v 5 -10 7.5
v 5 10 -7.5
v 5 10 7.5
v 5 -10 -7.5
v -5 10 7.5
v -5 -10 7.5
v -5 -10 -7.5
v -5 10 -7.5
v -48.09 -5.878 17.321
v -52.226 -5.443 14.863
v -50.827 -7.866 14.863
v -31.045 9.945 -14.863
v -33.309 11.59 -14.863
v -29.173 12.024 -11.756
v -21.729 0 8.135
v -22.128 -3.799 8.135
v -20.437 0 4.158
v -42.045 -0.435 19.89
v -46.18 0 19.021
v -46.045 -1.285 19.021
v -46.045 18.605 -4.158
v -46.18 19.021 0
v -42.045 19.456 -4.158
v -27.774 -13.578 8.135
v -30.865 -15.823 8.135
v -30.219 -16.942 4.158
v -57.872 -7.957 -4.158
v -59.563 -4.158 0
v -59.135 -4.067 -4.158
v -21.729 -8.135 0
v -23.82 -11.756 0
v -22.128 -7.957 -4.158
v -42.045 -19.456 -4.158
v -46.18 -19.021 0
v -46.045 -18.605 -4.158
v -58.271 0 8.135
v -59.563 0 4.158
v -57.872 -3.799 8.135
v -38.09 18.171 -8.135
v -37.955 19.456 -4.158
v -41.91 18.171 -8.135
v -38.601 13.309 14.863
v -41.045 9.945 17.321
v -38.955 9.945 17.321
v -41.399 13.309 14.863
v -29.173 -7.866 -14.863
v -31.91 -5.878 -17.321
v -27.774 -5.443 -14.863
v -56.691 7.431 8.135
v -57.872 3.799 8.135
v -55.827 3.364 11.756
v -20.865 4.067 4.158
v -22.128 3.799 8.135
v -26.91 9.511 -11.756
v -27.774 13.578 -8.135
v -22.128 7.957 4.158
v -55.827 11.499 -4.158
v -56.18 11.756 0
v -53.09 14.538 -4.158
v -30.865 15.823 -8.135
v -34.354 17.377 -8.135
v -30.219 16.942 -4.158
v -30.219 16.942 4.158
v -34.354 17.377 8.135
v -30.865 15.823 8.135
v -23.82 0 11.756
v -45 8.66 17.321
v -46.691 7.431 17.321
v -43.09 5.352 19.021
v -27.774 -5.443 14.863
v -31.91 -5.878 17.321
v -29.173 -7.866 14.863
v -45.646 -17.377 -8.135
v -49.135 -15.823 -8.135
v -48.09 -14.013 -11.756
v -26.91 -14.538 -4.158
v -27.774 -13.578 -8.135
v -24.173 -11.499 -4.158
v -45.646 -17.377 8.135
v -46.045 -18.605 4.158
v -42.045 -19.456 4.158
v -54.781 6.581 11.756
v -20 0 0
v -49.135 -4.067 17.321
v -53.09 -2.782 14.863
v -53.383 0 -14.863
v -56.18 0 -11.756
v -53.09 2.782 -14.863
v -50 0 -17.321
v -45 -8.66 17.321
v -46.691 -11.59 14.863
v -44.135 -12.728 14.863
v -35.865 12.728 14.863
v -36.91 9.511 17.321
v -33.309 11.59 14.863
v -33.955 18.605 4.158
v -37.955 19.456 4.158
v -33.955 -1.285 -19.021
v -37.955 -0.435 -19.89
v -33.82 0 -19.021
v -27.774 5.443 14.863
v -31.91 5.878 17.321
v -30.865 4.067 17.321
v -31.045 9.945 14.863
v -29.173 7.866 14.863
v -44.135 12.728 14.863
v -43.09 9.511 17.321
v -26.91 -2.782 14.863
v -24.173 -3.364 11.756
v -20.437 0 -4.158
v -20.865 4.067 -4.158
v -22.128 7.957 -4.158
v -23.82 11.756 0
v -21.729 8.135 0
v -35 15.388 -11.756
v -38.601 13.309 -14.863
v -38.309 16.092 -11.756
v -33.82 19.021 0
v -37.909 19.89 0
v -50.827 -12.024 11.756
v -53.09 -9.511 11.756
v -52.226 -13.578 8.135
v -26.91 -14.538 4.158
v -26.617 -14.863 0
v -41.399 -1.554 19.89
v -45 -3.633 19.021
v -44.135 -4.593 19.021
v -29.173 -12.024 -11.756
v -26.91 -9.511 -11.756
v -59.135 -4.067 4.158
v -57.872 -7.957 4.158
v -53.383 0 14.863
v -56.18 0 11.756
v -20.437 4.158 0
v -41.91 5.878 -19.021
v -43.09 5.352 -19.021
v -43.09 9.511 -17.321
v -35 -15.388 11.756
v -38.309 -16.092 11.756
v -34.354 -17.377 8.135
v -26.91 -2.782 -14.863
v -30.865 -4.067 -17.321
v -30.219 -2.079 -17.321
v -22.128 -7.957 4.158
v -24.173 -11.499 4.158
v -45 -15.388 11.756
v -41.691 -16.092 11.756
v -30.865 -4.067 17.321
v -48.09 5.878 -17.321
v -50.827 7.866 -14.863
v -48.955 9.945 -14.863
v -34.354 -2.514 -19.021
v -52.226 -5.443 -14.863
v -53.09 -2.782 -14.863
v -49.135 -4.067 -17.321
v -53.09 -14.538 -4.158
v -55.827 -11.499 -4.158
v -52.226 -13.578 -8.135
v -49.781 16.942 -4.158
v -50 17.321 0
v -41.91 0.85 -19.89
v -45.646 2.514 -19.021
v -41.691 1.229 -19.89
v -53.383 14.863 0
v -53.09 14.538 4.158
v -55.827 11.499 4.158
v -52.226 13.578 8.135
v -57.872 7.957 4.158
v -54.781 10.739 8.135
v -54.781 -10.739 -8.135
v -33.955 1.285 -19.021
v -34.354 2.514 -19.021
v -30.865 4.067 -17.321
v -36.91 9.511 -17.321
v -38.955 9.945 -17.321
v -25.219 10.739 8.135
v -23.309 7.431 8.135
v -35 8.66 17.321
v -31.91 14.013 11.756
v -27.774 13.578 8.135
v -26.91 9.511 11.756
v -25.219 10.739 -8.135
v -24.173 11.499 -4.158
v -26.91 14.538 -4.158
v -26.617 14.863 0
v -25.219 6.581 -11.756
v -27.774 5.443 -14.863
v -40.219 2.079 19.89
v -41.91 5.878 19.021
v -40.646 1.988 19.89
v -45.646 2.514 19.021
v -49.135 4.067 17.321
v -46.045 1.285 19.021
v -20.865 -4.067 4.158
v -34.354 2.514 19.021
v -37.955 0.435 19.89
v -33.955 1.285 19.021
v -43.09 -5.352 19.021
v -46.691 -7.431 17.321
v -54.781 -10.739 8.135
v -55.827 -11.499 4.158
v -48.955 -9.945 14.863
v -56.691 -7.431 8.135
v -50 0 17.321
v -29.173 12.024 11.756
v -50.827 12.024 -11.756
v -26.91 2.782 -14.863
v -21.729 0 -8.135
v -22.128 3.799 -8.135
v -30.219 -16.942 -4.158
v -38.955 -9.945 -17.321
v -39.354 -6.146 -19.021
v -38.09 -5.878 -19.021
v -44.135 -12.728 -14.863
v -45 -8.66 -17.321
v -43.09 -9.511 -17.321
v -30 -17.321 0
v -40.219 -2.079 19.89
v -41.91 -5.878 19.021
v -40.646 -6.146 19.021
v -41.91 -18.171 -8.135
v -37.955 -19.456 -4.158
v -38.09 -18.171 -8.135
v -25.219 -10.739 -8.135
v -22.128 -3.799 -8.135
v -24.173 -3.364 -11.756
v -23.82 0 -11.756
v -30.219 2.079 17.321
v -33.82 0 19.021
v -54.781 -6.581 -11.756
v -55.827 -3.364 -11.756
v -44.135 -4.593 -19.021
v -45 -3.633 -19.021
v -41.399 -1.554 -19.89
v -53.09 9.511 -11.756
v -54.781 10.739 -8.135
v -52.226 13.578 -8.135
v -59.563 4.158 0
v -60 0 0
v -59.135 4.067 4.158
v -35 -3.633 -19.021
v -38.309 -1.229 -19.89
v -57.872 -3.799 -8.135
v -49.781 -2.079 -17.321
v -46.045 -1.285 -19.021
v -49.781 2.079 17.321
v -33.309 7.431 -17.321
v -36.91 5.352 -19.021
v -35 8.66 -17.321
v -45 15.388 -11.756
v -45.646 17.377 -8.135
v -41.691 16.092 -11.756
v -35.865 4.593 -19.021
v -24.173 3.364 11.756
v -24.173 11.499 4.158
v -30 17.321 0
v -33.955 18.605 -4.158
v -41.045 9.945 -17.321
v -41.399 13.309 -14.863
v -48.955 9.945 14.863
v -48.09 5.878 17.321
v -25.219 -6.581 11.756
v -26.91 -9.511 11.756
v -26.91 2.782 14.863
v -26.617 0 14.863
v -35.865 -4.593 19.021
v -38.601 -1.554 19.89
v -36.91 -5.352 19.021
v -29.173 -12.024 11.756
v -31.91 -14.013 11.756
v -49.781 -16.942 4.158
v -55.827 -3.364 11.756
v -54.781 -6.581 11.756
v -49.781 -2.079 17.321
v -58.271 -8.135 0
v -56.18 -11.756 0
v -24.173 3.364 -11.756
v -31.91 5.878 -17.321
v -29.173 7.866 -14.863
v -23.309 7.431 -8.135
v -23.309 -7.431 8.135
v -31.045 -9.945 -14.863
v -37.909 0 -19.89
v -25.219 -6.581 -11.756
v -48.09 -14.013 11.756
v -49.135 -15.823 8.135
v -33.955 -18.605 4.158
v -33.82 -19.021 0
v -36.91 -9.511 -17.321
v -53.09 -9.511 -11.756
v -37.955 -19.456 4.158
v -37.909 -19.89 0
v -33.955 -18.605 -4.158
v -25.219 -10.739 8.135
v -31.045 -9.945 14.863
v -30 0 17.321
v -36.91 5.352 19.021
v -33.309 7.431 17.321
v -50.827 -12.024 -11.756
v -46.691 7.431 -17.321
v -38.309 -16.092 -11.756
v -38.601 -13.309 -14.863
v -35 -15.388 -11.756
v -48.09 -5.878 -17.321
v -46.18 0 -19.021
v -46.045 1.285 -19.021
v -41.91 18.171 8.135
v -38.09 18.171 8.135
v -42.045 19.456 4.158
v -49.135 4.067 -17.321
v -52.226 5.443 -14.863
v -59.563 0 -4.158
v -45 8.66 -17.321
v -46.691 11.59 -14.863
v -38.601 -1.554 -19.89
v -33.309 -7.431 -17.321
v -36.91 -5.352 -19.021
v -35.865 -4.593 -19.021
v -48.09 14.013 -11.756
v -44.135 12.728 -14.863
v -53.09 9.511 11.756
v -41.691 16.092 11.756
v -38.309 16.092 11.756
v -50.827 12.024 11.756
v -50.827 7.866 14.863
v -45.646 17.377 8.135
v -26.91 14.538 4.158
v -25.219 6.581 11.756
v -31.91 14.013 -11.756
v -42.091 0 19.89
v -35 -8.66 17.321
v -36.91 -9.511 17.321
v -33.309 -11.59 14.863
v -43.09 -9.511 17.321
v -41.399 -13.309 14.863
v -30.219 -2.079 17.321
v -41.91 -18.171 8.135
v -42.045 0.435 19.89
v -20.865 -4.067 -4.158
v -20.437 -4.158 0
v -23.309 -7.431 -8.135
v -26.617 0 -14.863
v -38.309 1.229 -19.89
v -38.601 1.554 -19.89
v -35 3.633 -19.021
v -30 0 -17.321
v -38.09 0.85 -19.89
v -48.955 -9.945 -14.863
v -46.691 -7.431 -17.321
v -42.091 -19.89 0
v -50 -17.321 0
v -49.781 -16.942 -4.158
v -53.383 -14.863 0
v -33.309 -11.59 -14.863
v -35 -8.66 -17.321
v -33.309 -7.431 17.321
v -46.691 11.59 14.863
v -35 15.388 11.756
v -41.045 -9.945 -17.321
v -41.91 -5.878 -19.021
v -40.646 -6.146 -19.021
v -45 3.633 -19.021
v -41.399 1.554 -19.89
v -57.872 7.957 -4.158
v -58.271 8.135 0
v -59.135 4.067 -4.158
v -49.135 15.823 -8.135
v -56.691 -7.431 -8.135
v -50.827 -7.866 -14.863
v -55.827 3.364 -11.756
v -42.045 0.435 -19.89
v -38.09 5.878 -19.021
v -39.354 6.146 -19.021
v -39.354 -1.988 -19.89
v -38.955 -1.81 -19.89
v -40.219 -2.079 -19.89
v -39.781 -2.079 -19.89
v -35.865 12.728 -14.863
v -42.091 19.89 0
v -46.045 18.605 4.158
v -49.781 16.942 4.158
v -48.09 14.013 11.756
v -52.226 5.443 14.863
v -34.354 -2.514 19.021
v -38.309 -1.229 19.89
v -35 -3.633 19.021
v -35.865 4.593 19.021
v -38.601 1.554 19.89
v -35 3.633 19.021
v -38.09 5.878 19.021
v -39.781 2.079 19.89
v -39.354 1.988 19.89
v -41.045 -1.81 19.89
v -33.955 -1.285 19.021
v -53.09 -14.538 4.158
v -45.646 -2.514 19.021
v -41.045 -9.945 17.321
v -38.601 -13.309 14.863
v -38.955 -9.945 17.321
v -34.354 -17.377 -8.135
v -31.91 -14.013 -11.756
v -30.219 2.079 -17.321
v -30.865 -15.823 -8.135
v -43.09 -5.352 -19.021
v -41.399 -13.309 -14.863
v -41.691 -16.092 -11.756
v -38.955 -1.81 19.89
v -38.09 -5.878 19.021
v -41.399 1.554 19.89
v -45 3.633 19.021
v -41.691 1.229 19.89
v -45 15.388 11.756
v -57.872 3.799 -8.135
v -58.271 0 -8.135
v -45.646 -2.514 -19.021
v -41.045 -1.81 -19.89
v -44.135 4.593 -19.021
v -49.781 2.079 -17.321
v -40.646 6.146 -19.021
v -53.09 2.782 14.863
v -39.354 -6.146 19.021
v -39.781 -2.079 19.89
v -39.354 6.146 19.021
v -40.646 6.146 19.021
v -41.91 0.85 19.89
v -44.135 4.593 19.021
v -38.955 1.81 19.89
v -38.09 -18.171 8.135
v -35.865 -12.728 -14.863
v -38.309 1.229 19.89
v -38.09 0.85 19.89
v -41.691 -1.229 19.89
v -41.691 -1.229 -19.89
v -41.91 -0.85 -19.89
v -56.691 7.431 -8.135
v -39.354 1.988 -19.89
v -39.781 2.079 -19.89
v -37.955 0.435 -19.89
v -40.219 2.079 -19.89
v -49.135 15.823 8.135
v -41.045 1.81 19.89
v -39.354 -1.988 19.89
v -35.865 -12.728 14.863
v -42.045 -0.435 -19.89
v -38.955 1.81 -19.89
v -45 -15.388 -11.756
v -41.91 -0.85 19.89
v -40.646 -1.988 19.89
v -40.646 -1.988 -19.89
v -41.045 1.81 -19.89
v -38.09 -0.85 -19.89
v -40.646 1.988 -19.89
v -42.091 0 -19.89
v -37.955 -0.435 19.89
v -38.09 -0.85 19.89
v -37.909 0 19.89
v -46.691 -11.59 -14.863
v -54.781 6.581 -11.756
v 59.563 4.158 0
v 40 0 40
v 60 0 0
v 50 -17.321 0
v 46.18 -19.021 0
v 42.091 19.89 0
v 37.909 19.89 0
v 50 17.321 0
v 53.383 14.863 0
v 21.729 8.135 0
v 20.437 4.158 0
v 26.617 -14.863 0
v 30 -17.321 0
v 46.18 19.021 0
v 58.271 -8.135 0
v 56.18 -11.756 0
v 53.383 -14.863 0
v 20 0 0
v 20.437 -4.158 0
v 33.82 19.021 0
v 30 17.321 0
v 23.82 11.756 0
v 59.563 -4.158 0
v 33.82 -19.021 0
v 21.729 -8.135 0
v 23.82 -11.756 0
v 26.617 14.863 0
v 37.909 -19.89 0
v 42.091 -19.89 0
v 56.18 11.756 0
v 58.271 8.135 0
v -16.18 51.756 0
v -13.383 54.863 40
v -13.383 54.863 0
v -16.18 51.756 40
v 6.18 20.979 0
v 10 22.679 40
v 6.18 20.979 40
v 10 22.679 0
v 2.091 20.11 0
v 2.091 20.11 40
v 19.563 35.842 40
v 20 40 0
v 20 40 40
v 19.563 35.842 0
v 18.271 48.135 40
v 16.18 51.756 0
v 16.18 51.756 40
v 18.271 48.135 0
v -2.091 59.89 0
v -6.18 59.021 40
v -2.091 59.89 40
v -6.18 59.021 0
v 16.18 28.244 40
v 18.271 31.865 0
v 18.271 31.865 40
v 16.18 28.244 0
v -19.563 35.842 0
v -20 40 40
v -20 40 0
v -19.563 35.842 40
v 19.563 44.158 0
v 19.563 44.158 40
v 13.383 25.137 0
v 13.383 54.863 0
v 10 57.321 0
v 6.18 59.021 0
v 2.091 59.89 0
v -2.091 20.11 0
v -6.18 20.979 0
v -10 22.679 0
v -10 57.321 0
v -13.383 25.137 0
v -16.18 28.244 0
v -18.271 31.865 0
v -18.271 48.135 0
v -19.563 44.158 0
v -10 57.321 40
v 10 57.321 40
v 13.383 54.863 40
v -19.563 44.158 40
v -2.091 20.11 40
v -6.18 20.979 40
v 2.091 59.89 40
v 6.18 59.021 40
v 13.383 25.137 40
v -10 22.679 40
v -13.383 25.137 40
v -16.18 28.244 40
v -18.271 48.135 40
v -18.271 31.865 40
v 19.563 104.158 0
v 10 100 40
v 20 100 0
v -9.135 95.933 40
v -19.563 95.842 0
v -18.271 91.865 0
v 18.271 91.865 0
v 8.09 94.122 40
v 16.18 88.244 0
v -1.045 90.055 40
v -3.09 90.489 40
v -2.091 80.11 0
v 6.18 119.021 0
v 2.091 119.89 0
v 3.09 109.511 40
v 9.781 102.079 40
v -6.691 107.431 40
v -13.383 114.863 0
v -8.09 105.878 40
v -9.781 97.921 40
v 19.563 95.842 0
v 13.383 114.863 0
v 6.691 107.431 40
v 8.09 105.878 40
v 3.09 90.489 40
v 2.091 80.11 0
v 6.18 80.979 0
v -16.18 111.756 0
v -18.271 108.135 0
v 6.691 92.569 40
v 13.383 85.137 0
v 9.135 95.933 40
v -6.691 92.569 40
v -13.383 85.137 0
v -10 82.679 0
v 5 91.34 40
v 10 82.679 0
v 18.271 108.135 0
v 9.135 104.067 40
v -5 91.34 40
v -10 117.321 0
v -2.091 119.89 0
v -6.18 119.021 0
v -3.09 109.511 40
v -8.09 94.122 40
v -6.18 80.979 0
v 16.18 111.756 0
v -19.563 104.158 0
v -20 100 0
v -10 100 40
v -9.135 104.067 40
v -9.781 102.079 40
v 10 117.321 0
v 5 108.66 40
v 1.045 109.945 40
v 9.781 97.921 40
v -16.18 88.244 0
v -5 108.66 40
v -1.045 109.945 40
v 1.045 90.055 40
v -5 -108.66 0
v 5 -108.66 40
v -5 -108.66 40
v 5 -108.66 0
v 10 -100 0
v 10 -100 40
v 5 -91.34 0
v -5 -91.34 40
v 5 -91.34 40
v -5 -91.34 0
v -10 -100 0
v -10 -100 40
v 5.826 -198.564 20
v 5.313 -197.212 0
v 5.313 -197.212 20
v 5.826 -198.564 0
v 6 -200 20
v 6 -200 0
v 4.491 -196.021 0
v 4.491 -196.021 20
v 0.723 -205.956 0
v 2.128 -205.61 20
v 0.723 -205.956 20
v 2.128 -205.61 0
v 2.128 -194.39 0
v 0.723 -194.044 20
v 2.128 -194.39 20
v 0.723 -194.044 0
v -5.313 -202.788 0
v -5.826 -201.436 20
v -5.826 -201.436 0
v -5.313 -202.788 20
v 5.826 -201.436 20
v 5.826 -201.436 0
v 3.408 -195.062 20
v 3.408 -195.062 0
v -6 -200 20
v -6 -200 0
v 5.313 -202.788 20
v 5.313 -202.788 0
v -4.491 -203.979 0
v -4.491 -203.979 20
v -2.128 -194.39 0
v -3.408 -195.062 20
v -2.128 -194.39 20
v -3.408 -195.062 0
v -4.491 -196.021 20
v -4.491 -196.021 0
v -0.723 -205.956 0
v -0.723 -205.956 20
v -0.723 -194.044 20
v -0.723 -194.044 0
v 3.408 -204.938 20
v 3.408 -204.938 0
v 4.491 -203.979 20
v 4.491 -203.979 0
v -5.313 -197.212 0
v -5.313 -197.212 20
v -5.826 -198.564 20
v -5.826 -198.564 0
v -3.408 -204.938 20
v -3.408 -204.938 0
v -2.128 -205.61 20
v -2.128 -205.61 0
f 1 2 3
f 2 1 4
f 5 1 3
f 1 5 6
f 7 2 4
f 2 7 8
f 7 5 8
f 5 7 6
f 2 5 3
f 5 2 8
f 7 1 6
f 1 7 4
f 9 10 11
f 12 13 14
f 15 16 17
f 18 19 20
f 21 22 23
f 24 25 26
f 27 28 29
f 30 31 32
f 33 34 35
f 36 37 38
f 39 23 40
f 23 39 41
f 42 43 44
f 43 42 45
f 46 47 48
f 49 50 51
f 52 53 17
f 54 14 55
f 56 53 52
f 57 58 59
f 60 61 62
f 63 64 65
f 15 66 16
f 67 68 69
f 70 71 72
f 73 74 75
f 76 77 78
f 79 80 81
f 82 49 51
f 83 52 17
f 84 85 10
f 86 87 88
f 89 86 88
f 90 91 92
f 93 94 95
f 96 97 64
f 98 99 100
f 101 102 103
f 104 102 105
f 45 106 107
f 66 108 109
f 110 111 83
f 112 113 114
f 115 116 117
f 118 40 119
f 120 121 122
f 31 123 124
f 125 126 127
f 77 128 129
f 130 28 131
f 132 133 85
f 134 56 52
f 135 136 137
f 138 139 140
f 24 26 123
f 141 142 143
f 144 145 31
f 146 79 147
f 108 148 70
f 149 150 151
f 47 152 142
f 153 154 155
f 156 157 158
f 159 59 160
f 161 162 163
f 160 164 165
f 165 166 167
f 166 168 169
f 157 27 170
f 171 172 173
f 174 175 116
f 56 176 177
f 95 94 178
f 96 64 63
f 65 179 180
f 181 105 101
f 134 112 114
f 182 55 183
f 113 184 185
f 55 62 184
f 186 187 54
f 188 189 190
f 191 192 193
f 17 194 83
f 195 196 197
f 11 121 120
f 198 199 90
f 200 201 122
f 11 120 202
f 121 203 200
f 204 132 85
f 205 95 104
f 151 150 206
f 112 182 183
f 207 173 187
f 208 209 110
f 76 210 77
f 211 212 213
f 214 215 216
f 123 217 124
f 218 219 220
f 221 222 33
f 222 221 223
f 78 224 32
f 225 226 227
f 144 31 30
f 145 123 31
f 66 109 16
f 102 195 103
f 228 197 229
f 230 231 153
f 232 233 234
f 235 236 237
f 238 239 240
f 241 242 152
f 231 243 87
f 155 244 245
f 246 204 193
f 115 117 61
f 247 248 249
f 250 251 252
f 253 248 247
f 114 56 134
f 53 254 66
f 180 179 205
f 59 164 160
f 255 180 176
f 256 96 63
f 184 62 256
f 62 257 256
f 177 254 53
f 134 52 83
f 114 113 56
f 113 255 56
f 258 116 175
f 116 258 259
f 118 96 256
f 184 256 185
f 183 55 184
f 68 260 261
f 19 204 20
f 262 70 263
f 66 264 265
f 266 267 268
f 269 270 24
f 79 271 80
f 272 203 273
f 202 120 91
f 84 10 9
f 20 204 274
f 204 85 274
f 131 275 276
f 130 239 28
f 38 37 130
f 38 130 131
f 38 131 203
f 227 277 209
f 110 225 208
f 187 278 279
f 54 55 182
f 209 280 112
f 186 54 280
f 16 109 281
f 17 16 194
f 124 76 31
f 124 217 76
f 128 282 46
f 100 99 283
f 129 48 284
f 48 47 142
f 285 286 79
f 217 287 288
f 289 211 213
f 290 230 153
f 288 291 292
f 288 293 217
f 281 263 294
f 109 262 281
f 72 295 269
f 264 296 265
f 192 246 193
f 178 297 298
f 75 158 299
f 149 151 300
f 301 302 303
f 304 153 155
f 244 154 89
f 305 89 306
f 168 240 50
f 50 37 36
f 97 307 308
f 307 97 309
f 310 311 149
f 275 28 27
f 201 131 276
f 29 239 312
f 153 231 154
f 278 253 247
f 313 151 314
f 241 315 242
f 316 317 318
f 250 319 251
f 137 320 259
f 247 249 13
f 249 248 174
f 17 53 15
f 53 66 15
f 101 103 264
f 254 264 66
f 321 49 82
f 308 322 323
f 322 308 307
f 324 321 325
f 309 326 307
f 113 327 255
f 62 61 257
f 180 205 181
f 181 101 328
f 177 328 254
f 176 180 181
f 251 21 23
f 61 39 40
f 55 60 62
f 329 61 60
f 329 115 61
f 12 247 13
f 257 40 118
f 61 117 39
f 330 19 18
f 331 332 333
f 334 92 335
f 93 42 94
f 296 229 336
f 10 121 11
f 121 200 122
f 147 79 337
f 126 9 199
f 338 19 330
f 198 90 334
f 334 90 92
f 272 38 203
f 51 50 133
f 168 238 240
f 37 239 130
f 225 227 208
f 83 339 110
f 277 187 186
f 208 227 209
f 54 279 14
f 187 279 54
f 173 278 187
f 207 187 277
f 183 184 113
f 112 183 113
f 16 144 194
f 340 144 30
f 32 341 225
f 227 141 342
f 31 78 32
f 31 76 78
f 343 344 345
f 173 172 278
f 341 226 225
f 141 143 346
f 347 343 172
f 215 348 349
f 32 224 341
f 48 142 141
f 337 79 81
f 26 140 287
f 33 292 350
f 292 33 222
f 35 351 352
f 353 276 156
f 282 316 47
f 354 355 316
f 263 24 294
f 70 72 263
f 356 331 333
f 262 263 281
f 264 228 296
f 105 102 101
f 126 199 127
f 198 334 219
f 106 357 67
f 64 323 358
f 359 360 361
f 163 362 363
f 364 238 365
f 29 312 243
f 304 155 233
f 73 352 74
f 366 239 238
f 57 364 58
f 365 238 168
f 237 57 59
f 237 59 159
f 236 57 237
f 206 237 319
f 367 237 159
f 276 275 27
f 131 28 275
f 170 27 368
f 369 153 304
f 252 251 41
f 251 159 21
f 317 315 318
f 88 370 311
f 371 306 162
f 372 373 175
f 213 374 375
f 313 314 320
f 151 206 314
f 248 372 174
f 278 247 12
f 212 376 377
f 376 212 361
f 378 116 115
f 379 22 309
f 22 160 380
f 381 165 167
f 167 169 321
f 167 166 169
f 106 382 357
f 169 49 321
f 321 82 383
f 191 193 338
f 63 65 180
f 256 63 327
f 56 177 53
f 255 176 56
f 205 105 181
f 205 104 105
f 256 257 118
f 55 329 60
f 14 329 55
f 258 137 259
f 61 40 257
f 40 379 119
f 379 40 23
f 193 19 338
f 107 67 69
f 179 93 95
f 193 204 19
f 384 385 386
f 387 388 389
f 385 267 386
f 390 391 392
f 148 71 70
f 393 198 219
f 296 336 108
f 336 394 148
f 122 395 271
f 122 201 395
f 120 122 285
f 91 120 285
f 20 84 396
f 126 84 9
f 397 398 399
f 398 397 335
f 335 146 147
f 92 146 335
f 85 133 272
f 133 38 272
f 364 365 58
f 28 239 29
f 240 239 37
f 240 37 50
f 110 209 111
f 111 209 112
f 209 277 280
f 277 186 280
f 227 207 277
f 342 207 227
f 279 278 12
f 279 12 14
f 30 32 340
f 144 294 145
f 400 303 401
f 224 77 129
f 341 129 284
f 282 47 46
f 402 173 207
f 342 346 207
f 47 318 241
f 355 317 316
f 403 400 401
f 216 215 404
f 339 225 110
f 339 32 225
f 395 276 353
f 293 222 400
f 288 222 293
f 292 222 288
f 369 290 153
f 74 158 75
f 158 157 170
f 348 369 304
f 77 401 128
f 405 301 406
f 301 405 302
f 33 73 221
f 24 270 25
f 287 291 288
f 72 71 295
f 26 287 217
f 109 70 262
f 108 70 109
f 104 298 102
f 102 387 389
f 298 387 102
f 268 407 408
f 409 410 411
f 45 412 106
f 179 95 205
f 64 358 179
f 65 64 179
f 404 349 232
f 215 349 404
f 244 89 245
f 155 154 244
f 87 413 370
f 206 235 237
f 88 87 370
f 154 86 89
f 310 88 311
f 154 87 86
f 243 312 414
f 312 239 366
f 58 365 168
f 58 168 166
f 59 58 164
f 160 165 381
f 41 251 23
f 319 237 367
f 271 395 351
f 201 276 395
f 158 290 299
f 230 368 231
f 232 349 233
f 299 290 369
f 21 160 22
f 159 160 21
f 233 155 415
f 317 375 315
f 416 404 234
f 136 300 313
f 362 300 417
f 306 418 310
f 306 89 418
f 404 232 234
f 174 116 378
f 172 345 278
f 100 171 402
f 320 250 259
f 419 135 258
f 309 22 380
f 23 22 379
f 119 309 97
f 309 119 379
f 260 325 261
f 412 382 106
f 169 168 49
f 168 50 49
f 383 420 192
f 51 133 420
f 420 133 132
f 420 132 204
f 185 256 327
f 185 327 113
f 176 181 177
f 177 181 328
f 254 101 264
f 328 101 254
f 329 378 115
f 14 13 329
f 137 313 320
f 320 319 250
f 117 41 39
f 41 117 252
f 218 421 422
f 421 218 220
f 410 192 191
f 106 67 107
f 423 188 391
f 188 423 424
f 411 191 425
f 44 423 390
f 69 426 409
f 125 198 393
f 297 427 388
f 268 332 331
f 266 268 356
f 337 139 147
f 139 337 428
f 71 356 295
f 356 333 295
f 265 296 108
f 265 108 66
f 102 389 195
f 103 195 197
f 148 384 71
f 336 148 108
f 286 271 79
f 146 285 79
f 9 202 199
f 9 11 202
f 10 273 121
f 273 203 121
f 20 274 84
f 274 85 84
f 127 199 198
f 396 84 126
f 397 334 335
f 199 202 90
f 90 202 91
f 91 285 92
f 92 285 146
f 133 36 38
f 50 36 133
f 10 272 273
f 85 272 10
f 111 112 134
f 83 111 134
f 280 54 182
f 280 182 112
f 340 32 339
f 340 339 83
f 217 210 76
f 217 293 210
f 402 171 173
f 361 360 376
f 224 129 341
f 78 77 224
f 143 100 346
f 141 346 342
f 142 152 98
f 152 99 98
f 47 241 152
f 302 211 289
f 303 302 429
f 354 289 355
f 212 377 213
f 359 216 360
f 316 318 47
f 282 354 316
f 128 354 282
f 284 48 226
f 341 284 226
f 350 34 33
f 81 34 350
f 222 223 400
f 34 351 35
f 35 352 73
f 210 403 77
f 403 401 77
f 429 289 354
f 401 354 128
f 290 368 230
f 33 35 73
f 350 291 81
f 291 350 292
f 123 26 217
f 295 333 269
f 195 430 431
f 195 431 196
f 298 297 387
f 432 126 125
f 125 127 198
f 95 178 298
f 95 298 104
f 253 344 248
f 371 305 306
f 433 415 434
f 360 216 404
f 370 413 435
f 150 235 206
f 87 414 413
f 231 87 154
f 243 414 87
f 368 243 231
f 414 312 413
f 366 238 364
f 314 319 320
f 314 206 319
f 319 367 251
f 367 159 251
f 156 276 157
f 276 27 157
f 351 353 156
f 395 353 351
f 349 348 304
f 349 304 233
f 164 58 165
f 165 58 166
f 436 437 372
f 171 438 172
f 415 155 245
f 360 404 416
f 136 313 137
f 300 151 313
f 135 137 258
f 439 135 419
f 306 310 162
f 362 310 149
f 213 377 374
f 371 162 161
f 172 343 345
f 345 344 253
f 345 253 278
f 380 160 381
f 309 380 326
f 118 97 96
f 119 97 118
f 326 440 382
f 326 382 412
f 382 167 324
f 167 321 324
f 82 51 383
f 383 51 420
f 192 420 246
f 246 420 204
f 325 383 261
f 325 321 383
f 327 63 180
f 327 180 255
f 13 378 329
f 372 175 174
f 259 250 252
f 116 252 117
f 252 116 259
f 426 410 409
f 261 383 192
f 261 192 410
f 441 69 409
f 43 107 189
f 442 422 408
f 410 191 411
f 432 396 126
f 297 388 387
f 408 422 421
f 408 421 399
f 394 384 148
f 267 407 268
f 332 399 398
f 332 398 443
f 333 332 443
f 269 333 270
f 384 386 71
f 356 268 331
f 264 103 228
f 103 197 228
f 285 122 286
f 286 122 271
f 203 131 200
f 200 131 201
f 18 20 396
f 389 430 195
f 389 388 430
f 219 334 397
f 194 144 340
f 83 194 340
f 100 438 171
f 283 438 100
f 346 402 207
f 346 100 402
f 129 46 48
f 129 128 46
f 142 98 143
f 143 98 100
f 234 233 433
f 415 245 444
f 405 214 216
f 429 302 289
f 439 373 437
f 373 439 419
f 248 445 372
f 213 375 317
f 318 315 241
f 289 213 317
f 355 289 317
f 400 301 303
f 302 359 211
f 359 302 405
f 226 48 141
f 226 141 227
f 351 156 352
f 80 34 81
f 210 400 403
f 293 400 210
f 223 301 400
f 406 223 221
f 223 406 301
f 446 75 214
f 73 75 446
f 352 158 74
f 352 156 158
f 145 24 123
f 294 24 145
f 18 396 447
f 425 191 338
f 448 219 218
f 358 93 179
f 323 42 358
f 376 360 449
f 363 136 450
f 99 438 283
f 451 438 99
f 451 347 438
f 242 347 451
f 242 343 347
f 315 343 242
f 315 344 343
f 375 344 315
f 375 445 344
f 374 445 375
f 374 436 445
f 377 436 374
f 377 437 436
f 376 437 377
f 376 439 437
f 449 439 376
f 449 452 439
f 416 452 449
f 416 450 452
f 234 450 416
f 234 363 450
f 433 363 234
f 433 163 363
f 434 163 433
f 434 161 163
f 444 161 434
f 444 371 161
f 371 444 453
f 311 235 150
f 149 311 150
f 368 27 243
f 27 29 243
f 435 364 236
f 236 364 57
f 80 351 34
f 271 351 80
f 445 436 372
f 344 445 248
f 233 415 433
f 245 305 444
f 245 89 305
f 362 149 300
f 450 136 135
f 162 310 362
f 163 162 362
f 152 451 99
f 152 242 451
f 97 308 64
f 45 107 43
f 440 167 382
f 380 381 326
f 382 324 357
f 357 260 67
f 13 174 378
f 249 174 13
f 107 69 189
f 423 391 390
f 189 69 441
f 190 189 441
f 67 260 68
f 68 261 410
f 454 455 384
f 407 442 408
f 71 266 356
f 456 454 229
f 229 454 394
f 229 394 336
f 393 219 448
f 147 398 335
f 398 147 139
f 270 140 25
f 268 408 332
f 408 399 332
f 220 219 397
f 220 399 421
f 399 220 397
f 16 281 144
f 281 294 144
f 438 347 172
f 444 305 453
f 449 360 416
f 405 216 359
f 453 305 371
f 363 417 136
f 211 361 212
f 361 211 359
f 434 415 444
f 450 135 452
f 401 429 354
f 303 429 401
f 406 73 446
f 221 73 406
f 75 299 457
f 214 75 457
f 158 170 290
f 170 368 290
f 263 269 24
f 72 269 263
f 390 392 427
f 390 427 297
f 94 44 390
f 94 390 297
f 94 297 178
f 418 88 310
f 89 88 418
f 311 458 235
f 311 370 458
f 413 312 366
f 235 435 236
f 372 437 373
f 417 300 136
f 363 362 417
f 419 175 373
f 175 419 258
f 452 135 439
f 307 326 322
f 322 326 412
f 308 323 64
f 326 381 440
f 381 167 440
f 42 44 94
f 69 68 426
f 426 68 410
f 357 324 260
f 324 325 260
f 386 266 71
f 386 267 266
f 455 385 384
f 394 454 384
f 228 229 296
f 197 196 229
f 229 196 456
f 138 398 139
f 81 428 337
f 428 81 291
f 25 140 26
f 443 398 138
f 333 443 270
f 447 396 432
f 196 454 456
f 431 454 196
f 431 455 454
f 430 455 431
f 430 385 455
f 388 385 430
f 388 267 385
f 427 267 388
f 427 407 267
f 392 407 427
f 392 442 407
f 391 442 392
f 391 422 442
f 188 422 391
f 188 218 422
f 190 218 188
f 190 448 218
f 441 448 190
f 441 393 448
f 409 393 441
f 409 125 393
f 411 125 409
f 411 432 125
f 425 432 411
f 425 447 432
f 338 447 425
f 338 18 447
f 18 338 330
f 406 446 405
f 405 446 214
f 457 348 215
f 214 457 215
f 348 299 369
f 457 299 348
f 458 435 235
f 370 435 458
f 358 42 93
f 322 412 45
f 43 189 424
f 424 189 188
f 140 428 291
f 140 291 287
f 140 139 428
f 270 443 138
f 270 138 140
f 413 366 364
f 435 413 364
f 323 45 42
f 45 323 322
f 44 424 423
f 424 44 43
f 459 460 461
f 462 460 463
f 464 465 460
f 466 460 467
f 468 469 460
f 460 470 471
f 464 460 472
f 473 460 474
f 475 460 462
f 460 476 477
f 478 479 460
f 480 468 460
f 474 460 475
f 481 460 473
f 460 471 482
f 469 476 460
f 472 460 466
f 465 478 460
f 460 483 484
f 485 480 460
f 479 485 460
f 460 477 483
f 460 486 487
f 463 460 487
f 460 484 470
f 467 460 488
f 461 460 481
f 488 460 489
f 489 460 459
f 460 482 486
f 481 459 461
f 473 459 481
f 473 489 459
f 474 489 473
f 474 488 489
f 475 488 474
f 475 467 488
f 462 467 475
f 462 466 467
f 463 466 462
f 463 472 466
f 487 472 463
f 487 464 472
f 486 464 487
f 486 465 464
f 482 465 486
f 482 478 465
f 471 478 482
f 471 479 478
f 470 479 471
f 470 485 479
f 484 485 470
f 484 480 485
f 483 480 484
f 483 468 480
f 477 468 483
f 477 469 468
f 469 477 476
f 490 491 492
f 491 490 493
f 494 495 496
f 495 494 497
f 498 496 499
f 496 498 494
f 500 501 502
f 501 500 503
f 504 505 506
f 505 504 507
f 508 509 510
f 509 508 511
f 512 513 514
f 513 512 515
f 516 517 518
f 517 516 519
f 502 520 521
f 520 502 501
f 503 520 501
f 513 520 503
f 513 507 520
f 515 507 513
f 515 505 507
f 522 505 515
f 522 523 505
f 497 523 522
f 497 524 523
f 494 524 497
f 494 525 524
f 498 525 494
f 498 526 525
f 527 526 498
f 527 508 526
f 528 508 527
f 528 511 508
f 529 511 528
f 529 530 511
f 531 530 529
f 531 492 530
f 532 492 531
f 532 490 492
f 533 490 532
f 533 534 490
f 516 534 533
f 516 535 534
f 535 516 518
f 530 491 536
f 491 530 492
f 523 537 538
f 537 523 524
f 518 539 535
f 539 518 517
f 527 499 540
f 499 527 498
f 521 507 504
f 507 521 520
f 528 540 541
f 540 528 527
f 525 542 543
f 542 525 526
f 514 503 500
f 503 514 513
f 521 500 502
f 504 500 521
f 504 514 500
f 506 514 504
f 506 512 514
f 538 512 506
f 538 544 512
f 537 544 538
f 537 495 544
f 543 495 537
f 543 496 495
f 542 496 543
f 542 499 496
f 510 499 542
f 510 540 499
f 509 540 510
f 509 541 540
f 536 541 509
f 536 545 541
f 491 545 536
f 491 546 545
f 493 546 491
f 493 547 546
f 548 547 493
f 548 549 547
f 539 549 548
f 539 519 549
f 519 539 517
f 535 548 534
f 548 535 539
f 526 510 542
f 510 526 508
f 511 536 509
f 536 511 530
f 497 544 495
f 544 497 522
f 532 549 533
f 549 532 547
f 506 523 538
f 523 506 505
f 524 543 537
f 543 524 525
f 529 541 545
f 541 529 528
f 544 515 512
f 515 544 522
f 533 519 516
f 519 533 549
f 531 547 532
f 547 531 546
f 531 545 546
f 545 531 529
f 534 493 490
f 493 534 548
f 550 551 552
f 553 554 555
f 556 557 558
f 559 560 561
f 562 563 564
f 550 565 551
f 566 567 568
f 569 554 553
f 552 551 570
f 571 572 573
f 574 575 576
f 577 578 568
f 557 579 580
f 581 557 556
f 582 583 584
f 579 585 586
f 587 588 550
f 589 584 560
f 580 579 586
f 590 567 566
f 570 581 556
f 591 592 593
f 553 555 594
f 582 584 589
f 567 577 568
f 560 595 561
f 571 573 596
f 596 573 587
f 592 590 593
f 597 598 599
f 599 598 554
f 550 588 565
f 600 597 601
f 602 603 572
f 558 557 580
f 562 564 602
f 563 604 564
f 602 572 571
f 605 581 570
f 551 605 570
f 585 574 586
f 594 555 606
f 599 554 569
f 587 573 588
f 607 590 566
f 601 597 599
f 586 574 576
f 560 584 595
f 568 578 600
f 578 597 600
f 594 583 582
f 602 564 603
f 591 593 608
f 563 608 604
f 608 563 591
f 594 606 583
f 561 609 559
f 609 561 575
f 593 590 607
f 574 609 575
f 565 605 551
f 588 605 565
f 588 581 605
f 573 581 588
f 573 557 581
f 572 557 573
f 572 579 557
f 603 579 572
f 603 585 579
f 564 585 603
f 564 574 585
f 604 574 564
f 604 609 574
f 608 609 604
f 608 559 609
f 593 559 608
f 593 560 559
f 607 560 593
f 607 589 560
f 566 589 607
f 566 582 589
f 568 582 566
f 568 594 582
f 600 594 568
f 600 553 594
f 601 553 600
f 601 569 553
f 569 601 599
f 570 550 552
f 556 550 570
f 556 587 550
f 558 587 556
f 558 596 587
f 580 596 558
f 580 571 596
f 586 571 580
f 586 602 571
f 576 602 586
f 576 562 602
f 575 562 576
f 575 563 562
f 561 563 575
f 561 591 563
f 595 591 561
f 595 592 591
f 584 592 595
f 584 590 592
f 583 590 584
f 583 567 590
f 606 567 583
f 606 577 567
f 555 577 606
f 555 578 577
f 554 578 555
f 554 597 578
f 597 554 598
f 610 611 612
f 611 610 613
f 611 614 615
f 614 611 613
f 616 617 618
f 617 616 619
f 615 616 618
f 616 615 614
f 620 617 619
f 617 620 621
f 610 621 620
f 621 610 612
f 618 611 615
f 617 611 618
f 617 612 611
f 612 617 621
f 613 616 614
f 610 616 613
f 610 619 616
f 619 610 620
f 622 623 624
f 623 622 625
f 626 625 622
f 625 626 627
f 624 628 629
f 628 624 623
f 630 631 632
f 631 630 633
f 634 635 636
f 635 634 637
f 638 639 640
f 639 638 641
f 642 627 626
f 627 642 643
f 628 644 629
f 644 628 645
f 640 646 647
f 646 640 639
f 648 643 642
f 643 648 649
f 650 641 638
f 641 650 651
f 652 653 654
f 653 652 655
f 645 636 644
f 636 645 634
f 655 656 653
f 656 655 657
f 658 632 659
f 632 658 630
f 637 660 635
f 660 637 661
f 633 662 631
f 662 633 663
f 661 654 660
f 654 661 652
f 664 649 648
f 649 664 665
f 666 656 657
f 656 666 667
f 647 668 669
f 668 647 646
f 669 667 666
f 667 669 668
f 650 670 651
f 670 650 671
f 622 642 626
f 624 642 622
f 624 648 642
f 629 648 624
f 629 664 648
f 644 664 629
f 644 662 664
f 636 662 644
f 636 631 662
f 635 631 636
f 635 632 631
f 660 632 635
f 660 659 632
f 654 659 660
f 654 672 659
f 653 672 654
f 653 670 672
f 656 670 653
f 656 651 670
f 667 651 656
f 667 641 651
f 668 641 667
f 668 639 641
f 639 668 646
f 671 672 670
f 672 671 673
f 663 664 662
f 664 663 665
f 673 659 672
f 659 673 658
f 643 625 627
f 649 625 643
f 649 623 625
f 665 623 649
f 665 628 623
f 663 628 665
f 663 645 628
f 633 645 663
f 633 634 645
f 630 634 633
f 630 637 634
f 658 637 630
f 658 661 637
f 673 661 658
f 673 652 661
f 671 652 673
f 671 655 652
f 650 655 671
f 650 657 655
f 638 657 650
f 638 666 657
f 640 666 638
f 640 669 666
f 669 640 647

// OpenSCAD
// Cube
cube([10, 20 ,15], center = true);

// Sphere
translate([-40,0,0]){
sphere(r = 20);
}

// Cylinder -> Cone
translate([40,0 ,0]){
cylinder(h = 40, r1 = 20, r2 = 0);
} 

// Cylinder
translate([0,40 ,0]){
cylinder(h = 40, r = 20);
}    

// Cylinder Nr. 2
translate([0,100 ,0]){
cylinder(h = 40, r1 = 20, r2 = 10);
}   

// Cylinder with 6 faces
translate([0,-100,0]){
cylinder(h = 40, r = 10, $fn=6);
}    

// Cylinder with fa = maximum angle and fs = maximum size
translate([0,-200,0]){
cylinder(r=6, h=20, $fa=1, $fs=1.5);
}    
